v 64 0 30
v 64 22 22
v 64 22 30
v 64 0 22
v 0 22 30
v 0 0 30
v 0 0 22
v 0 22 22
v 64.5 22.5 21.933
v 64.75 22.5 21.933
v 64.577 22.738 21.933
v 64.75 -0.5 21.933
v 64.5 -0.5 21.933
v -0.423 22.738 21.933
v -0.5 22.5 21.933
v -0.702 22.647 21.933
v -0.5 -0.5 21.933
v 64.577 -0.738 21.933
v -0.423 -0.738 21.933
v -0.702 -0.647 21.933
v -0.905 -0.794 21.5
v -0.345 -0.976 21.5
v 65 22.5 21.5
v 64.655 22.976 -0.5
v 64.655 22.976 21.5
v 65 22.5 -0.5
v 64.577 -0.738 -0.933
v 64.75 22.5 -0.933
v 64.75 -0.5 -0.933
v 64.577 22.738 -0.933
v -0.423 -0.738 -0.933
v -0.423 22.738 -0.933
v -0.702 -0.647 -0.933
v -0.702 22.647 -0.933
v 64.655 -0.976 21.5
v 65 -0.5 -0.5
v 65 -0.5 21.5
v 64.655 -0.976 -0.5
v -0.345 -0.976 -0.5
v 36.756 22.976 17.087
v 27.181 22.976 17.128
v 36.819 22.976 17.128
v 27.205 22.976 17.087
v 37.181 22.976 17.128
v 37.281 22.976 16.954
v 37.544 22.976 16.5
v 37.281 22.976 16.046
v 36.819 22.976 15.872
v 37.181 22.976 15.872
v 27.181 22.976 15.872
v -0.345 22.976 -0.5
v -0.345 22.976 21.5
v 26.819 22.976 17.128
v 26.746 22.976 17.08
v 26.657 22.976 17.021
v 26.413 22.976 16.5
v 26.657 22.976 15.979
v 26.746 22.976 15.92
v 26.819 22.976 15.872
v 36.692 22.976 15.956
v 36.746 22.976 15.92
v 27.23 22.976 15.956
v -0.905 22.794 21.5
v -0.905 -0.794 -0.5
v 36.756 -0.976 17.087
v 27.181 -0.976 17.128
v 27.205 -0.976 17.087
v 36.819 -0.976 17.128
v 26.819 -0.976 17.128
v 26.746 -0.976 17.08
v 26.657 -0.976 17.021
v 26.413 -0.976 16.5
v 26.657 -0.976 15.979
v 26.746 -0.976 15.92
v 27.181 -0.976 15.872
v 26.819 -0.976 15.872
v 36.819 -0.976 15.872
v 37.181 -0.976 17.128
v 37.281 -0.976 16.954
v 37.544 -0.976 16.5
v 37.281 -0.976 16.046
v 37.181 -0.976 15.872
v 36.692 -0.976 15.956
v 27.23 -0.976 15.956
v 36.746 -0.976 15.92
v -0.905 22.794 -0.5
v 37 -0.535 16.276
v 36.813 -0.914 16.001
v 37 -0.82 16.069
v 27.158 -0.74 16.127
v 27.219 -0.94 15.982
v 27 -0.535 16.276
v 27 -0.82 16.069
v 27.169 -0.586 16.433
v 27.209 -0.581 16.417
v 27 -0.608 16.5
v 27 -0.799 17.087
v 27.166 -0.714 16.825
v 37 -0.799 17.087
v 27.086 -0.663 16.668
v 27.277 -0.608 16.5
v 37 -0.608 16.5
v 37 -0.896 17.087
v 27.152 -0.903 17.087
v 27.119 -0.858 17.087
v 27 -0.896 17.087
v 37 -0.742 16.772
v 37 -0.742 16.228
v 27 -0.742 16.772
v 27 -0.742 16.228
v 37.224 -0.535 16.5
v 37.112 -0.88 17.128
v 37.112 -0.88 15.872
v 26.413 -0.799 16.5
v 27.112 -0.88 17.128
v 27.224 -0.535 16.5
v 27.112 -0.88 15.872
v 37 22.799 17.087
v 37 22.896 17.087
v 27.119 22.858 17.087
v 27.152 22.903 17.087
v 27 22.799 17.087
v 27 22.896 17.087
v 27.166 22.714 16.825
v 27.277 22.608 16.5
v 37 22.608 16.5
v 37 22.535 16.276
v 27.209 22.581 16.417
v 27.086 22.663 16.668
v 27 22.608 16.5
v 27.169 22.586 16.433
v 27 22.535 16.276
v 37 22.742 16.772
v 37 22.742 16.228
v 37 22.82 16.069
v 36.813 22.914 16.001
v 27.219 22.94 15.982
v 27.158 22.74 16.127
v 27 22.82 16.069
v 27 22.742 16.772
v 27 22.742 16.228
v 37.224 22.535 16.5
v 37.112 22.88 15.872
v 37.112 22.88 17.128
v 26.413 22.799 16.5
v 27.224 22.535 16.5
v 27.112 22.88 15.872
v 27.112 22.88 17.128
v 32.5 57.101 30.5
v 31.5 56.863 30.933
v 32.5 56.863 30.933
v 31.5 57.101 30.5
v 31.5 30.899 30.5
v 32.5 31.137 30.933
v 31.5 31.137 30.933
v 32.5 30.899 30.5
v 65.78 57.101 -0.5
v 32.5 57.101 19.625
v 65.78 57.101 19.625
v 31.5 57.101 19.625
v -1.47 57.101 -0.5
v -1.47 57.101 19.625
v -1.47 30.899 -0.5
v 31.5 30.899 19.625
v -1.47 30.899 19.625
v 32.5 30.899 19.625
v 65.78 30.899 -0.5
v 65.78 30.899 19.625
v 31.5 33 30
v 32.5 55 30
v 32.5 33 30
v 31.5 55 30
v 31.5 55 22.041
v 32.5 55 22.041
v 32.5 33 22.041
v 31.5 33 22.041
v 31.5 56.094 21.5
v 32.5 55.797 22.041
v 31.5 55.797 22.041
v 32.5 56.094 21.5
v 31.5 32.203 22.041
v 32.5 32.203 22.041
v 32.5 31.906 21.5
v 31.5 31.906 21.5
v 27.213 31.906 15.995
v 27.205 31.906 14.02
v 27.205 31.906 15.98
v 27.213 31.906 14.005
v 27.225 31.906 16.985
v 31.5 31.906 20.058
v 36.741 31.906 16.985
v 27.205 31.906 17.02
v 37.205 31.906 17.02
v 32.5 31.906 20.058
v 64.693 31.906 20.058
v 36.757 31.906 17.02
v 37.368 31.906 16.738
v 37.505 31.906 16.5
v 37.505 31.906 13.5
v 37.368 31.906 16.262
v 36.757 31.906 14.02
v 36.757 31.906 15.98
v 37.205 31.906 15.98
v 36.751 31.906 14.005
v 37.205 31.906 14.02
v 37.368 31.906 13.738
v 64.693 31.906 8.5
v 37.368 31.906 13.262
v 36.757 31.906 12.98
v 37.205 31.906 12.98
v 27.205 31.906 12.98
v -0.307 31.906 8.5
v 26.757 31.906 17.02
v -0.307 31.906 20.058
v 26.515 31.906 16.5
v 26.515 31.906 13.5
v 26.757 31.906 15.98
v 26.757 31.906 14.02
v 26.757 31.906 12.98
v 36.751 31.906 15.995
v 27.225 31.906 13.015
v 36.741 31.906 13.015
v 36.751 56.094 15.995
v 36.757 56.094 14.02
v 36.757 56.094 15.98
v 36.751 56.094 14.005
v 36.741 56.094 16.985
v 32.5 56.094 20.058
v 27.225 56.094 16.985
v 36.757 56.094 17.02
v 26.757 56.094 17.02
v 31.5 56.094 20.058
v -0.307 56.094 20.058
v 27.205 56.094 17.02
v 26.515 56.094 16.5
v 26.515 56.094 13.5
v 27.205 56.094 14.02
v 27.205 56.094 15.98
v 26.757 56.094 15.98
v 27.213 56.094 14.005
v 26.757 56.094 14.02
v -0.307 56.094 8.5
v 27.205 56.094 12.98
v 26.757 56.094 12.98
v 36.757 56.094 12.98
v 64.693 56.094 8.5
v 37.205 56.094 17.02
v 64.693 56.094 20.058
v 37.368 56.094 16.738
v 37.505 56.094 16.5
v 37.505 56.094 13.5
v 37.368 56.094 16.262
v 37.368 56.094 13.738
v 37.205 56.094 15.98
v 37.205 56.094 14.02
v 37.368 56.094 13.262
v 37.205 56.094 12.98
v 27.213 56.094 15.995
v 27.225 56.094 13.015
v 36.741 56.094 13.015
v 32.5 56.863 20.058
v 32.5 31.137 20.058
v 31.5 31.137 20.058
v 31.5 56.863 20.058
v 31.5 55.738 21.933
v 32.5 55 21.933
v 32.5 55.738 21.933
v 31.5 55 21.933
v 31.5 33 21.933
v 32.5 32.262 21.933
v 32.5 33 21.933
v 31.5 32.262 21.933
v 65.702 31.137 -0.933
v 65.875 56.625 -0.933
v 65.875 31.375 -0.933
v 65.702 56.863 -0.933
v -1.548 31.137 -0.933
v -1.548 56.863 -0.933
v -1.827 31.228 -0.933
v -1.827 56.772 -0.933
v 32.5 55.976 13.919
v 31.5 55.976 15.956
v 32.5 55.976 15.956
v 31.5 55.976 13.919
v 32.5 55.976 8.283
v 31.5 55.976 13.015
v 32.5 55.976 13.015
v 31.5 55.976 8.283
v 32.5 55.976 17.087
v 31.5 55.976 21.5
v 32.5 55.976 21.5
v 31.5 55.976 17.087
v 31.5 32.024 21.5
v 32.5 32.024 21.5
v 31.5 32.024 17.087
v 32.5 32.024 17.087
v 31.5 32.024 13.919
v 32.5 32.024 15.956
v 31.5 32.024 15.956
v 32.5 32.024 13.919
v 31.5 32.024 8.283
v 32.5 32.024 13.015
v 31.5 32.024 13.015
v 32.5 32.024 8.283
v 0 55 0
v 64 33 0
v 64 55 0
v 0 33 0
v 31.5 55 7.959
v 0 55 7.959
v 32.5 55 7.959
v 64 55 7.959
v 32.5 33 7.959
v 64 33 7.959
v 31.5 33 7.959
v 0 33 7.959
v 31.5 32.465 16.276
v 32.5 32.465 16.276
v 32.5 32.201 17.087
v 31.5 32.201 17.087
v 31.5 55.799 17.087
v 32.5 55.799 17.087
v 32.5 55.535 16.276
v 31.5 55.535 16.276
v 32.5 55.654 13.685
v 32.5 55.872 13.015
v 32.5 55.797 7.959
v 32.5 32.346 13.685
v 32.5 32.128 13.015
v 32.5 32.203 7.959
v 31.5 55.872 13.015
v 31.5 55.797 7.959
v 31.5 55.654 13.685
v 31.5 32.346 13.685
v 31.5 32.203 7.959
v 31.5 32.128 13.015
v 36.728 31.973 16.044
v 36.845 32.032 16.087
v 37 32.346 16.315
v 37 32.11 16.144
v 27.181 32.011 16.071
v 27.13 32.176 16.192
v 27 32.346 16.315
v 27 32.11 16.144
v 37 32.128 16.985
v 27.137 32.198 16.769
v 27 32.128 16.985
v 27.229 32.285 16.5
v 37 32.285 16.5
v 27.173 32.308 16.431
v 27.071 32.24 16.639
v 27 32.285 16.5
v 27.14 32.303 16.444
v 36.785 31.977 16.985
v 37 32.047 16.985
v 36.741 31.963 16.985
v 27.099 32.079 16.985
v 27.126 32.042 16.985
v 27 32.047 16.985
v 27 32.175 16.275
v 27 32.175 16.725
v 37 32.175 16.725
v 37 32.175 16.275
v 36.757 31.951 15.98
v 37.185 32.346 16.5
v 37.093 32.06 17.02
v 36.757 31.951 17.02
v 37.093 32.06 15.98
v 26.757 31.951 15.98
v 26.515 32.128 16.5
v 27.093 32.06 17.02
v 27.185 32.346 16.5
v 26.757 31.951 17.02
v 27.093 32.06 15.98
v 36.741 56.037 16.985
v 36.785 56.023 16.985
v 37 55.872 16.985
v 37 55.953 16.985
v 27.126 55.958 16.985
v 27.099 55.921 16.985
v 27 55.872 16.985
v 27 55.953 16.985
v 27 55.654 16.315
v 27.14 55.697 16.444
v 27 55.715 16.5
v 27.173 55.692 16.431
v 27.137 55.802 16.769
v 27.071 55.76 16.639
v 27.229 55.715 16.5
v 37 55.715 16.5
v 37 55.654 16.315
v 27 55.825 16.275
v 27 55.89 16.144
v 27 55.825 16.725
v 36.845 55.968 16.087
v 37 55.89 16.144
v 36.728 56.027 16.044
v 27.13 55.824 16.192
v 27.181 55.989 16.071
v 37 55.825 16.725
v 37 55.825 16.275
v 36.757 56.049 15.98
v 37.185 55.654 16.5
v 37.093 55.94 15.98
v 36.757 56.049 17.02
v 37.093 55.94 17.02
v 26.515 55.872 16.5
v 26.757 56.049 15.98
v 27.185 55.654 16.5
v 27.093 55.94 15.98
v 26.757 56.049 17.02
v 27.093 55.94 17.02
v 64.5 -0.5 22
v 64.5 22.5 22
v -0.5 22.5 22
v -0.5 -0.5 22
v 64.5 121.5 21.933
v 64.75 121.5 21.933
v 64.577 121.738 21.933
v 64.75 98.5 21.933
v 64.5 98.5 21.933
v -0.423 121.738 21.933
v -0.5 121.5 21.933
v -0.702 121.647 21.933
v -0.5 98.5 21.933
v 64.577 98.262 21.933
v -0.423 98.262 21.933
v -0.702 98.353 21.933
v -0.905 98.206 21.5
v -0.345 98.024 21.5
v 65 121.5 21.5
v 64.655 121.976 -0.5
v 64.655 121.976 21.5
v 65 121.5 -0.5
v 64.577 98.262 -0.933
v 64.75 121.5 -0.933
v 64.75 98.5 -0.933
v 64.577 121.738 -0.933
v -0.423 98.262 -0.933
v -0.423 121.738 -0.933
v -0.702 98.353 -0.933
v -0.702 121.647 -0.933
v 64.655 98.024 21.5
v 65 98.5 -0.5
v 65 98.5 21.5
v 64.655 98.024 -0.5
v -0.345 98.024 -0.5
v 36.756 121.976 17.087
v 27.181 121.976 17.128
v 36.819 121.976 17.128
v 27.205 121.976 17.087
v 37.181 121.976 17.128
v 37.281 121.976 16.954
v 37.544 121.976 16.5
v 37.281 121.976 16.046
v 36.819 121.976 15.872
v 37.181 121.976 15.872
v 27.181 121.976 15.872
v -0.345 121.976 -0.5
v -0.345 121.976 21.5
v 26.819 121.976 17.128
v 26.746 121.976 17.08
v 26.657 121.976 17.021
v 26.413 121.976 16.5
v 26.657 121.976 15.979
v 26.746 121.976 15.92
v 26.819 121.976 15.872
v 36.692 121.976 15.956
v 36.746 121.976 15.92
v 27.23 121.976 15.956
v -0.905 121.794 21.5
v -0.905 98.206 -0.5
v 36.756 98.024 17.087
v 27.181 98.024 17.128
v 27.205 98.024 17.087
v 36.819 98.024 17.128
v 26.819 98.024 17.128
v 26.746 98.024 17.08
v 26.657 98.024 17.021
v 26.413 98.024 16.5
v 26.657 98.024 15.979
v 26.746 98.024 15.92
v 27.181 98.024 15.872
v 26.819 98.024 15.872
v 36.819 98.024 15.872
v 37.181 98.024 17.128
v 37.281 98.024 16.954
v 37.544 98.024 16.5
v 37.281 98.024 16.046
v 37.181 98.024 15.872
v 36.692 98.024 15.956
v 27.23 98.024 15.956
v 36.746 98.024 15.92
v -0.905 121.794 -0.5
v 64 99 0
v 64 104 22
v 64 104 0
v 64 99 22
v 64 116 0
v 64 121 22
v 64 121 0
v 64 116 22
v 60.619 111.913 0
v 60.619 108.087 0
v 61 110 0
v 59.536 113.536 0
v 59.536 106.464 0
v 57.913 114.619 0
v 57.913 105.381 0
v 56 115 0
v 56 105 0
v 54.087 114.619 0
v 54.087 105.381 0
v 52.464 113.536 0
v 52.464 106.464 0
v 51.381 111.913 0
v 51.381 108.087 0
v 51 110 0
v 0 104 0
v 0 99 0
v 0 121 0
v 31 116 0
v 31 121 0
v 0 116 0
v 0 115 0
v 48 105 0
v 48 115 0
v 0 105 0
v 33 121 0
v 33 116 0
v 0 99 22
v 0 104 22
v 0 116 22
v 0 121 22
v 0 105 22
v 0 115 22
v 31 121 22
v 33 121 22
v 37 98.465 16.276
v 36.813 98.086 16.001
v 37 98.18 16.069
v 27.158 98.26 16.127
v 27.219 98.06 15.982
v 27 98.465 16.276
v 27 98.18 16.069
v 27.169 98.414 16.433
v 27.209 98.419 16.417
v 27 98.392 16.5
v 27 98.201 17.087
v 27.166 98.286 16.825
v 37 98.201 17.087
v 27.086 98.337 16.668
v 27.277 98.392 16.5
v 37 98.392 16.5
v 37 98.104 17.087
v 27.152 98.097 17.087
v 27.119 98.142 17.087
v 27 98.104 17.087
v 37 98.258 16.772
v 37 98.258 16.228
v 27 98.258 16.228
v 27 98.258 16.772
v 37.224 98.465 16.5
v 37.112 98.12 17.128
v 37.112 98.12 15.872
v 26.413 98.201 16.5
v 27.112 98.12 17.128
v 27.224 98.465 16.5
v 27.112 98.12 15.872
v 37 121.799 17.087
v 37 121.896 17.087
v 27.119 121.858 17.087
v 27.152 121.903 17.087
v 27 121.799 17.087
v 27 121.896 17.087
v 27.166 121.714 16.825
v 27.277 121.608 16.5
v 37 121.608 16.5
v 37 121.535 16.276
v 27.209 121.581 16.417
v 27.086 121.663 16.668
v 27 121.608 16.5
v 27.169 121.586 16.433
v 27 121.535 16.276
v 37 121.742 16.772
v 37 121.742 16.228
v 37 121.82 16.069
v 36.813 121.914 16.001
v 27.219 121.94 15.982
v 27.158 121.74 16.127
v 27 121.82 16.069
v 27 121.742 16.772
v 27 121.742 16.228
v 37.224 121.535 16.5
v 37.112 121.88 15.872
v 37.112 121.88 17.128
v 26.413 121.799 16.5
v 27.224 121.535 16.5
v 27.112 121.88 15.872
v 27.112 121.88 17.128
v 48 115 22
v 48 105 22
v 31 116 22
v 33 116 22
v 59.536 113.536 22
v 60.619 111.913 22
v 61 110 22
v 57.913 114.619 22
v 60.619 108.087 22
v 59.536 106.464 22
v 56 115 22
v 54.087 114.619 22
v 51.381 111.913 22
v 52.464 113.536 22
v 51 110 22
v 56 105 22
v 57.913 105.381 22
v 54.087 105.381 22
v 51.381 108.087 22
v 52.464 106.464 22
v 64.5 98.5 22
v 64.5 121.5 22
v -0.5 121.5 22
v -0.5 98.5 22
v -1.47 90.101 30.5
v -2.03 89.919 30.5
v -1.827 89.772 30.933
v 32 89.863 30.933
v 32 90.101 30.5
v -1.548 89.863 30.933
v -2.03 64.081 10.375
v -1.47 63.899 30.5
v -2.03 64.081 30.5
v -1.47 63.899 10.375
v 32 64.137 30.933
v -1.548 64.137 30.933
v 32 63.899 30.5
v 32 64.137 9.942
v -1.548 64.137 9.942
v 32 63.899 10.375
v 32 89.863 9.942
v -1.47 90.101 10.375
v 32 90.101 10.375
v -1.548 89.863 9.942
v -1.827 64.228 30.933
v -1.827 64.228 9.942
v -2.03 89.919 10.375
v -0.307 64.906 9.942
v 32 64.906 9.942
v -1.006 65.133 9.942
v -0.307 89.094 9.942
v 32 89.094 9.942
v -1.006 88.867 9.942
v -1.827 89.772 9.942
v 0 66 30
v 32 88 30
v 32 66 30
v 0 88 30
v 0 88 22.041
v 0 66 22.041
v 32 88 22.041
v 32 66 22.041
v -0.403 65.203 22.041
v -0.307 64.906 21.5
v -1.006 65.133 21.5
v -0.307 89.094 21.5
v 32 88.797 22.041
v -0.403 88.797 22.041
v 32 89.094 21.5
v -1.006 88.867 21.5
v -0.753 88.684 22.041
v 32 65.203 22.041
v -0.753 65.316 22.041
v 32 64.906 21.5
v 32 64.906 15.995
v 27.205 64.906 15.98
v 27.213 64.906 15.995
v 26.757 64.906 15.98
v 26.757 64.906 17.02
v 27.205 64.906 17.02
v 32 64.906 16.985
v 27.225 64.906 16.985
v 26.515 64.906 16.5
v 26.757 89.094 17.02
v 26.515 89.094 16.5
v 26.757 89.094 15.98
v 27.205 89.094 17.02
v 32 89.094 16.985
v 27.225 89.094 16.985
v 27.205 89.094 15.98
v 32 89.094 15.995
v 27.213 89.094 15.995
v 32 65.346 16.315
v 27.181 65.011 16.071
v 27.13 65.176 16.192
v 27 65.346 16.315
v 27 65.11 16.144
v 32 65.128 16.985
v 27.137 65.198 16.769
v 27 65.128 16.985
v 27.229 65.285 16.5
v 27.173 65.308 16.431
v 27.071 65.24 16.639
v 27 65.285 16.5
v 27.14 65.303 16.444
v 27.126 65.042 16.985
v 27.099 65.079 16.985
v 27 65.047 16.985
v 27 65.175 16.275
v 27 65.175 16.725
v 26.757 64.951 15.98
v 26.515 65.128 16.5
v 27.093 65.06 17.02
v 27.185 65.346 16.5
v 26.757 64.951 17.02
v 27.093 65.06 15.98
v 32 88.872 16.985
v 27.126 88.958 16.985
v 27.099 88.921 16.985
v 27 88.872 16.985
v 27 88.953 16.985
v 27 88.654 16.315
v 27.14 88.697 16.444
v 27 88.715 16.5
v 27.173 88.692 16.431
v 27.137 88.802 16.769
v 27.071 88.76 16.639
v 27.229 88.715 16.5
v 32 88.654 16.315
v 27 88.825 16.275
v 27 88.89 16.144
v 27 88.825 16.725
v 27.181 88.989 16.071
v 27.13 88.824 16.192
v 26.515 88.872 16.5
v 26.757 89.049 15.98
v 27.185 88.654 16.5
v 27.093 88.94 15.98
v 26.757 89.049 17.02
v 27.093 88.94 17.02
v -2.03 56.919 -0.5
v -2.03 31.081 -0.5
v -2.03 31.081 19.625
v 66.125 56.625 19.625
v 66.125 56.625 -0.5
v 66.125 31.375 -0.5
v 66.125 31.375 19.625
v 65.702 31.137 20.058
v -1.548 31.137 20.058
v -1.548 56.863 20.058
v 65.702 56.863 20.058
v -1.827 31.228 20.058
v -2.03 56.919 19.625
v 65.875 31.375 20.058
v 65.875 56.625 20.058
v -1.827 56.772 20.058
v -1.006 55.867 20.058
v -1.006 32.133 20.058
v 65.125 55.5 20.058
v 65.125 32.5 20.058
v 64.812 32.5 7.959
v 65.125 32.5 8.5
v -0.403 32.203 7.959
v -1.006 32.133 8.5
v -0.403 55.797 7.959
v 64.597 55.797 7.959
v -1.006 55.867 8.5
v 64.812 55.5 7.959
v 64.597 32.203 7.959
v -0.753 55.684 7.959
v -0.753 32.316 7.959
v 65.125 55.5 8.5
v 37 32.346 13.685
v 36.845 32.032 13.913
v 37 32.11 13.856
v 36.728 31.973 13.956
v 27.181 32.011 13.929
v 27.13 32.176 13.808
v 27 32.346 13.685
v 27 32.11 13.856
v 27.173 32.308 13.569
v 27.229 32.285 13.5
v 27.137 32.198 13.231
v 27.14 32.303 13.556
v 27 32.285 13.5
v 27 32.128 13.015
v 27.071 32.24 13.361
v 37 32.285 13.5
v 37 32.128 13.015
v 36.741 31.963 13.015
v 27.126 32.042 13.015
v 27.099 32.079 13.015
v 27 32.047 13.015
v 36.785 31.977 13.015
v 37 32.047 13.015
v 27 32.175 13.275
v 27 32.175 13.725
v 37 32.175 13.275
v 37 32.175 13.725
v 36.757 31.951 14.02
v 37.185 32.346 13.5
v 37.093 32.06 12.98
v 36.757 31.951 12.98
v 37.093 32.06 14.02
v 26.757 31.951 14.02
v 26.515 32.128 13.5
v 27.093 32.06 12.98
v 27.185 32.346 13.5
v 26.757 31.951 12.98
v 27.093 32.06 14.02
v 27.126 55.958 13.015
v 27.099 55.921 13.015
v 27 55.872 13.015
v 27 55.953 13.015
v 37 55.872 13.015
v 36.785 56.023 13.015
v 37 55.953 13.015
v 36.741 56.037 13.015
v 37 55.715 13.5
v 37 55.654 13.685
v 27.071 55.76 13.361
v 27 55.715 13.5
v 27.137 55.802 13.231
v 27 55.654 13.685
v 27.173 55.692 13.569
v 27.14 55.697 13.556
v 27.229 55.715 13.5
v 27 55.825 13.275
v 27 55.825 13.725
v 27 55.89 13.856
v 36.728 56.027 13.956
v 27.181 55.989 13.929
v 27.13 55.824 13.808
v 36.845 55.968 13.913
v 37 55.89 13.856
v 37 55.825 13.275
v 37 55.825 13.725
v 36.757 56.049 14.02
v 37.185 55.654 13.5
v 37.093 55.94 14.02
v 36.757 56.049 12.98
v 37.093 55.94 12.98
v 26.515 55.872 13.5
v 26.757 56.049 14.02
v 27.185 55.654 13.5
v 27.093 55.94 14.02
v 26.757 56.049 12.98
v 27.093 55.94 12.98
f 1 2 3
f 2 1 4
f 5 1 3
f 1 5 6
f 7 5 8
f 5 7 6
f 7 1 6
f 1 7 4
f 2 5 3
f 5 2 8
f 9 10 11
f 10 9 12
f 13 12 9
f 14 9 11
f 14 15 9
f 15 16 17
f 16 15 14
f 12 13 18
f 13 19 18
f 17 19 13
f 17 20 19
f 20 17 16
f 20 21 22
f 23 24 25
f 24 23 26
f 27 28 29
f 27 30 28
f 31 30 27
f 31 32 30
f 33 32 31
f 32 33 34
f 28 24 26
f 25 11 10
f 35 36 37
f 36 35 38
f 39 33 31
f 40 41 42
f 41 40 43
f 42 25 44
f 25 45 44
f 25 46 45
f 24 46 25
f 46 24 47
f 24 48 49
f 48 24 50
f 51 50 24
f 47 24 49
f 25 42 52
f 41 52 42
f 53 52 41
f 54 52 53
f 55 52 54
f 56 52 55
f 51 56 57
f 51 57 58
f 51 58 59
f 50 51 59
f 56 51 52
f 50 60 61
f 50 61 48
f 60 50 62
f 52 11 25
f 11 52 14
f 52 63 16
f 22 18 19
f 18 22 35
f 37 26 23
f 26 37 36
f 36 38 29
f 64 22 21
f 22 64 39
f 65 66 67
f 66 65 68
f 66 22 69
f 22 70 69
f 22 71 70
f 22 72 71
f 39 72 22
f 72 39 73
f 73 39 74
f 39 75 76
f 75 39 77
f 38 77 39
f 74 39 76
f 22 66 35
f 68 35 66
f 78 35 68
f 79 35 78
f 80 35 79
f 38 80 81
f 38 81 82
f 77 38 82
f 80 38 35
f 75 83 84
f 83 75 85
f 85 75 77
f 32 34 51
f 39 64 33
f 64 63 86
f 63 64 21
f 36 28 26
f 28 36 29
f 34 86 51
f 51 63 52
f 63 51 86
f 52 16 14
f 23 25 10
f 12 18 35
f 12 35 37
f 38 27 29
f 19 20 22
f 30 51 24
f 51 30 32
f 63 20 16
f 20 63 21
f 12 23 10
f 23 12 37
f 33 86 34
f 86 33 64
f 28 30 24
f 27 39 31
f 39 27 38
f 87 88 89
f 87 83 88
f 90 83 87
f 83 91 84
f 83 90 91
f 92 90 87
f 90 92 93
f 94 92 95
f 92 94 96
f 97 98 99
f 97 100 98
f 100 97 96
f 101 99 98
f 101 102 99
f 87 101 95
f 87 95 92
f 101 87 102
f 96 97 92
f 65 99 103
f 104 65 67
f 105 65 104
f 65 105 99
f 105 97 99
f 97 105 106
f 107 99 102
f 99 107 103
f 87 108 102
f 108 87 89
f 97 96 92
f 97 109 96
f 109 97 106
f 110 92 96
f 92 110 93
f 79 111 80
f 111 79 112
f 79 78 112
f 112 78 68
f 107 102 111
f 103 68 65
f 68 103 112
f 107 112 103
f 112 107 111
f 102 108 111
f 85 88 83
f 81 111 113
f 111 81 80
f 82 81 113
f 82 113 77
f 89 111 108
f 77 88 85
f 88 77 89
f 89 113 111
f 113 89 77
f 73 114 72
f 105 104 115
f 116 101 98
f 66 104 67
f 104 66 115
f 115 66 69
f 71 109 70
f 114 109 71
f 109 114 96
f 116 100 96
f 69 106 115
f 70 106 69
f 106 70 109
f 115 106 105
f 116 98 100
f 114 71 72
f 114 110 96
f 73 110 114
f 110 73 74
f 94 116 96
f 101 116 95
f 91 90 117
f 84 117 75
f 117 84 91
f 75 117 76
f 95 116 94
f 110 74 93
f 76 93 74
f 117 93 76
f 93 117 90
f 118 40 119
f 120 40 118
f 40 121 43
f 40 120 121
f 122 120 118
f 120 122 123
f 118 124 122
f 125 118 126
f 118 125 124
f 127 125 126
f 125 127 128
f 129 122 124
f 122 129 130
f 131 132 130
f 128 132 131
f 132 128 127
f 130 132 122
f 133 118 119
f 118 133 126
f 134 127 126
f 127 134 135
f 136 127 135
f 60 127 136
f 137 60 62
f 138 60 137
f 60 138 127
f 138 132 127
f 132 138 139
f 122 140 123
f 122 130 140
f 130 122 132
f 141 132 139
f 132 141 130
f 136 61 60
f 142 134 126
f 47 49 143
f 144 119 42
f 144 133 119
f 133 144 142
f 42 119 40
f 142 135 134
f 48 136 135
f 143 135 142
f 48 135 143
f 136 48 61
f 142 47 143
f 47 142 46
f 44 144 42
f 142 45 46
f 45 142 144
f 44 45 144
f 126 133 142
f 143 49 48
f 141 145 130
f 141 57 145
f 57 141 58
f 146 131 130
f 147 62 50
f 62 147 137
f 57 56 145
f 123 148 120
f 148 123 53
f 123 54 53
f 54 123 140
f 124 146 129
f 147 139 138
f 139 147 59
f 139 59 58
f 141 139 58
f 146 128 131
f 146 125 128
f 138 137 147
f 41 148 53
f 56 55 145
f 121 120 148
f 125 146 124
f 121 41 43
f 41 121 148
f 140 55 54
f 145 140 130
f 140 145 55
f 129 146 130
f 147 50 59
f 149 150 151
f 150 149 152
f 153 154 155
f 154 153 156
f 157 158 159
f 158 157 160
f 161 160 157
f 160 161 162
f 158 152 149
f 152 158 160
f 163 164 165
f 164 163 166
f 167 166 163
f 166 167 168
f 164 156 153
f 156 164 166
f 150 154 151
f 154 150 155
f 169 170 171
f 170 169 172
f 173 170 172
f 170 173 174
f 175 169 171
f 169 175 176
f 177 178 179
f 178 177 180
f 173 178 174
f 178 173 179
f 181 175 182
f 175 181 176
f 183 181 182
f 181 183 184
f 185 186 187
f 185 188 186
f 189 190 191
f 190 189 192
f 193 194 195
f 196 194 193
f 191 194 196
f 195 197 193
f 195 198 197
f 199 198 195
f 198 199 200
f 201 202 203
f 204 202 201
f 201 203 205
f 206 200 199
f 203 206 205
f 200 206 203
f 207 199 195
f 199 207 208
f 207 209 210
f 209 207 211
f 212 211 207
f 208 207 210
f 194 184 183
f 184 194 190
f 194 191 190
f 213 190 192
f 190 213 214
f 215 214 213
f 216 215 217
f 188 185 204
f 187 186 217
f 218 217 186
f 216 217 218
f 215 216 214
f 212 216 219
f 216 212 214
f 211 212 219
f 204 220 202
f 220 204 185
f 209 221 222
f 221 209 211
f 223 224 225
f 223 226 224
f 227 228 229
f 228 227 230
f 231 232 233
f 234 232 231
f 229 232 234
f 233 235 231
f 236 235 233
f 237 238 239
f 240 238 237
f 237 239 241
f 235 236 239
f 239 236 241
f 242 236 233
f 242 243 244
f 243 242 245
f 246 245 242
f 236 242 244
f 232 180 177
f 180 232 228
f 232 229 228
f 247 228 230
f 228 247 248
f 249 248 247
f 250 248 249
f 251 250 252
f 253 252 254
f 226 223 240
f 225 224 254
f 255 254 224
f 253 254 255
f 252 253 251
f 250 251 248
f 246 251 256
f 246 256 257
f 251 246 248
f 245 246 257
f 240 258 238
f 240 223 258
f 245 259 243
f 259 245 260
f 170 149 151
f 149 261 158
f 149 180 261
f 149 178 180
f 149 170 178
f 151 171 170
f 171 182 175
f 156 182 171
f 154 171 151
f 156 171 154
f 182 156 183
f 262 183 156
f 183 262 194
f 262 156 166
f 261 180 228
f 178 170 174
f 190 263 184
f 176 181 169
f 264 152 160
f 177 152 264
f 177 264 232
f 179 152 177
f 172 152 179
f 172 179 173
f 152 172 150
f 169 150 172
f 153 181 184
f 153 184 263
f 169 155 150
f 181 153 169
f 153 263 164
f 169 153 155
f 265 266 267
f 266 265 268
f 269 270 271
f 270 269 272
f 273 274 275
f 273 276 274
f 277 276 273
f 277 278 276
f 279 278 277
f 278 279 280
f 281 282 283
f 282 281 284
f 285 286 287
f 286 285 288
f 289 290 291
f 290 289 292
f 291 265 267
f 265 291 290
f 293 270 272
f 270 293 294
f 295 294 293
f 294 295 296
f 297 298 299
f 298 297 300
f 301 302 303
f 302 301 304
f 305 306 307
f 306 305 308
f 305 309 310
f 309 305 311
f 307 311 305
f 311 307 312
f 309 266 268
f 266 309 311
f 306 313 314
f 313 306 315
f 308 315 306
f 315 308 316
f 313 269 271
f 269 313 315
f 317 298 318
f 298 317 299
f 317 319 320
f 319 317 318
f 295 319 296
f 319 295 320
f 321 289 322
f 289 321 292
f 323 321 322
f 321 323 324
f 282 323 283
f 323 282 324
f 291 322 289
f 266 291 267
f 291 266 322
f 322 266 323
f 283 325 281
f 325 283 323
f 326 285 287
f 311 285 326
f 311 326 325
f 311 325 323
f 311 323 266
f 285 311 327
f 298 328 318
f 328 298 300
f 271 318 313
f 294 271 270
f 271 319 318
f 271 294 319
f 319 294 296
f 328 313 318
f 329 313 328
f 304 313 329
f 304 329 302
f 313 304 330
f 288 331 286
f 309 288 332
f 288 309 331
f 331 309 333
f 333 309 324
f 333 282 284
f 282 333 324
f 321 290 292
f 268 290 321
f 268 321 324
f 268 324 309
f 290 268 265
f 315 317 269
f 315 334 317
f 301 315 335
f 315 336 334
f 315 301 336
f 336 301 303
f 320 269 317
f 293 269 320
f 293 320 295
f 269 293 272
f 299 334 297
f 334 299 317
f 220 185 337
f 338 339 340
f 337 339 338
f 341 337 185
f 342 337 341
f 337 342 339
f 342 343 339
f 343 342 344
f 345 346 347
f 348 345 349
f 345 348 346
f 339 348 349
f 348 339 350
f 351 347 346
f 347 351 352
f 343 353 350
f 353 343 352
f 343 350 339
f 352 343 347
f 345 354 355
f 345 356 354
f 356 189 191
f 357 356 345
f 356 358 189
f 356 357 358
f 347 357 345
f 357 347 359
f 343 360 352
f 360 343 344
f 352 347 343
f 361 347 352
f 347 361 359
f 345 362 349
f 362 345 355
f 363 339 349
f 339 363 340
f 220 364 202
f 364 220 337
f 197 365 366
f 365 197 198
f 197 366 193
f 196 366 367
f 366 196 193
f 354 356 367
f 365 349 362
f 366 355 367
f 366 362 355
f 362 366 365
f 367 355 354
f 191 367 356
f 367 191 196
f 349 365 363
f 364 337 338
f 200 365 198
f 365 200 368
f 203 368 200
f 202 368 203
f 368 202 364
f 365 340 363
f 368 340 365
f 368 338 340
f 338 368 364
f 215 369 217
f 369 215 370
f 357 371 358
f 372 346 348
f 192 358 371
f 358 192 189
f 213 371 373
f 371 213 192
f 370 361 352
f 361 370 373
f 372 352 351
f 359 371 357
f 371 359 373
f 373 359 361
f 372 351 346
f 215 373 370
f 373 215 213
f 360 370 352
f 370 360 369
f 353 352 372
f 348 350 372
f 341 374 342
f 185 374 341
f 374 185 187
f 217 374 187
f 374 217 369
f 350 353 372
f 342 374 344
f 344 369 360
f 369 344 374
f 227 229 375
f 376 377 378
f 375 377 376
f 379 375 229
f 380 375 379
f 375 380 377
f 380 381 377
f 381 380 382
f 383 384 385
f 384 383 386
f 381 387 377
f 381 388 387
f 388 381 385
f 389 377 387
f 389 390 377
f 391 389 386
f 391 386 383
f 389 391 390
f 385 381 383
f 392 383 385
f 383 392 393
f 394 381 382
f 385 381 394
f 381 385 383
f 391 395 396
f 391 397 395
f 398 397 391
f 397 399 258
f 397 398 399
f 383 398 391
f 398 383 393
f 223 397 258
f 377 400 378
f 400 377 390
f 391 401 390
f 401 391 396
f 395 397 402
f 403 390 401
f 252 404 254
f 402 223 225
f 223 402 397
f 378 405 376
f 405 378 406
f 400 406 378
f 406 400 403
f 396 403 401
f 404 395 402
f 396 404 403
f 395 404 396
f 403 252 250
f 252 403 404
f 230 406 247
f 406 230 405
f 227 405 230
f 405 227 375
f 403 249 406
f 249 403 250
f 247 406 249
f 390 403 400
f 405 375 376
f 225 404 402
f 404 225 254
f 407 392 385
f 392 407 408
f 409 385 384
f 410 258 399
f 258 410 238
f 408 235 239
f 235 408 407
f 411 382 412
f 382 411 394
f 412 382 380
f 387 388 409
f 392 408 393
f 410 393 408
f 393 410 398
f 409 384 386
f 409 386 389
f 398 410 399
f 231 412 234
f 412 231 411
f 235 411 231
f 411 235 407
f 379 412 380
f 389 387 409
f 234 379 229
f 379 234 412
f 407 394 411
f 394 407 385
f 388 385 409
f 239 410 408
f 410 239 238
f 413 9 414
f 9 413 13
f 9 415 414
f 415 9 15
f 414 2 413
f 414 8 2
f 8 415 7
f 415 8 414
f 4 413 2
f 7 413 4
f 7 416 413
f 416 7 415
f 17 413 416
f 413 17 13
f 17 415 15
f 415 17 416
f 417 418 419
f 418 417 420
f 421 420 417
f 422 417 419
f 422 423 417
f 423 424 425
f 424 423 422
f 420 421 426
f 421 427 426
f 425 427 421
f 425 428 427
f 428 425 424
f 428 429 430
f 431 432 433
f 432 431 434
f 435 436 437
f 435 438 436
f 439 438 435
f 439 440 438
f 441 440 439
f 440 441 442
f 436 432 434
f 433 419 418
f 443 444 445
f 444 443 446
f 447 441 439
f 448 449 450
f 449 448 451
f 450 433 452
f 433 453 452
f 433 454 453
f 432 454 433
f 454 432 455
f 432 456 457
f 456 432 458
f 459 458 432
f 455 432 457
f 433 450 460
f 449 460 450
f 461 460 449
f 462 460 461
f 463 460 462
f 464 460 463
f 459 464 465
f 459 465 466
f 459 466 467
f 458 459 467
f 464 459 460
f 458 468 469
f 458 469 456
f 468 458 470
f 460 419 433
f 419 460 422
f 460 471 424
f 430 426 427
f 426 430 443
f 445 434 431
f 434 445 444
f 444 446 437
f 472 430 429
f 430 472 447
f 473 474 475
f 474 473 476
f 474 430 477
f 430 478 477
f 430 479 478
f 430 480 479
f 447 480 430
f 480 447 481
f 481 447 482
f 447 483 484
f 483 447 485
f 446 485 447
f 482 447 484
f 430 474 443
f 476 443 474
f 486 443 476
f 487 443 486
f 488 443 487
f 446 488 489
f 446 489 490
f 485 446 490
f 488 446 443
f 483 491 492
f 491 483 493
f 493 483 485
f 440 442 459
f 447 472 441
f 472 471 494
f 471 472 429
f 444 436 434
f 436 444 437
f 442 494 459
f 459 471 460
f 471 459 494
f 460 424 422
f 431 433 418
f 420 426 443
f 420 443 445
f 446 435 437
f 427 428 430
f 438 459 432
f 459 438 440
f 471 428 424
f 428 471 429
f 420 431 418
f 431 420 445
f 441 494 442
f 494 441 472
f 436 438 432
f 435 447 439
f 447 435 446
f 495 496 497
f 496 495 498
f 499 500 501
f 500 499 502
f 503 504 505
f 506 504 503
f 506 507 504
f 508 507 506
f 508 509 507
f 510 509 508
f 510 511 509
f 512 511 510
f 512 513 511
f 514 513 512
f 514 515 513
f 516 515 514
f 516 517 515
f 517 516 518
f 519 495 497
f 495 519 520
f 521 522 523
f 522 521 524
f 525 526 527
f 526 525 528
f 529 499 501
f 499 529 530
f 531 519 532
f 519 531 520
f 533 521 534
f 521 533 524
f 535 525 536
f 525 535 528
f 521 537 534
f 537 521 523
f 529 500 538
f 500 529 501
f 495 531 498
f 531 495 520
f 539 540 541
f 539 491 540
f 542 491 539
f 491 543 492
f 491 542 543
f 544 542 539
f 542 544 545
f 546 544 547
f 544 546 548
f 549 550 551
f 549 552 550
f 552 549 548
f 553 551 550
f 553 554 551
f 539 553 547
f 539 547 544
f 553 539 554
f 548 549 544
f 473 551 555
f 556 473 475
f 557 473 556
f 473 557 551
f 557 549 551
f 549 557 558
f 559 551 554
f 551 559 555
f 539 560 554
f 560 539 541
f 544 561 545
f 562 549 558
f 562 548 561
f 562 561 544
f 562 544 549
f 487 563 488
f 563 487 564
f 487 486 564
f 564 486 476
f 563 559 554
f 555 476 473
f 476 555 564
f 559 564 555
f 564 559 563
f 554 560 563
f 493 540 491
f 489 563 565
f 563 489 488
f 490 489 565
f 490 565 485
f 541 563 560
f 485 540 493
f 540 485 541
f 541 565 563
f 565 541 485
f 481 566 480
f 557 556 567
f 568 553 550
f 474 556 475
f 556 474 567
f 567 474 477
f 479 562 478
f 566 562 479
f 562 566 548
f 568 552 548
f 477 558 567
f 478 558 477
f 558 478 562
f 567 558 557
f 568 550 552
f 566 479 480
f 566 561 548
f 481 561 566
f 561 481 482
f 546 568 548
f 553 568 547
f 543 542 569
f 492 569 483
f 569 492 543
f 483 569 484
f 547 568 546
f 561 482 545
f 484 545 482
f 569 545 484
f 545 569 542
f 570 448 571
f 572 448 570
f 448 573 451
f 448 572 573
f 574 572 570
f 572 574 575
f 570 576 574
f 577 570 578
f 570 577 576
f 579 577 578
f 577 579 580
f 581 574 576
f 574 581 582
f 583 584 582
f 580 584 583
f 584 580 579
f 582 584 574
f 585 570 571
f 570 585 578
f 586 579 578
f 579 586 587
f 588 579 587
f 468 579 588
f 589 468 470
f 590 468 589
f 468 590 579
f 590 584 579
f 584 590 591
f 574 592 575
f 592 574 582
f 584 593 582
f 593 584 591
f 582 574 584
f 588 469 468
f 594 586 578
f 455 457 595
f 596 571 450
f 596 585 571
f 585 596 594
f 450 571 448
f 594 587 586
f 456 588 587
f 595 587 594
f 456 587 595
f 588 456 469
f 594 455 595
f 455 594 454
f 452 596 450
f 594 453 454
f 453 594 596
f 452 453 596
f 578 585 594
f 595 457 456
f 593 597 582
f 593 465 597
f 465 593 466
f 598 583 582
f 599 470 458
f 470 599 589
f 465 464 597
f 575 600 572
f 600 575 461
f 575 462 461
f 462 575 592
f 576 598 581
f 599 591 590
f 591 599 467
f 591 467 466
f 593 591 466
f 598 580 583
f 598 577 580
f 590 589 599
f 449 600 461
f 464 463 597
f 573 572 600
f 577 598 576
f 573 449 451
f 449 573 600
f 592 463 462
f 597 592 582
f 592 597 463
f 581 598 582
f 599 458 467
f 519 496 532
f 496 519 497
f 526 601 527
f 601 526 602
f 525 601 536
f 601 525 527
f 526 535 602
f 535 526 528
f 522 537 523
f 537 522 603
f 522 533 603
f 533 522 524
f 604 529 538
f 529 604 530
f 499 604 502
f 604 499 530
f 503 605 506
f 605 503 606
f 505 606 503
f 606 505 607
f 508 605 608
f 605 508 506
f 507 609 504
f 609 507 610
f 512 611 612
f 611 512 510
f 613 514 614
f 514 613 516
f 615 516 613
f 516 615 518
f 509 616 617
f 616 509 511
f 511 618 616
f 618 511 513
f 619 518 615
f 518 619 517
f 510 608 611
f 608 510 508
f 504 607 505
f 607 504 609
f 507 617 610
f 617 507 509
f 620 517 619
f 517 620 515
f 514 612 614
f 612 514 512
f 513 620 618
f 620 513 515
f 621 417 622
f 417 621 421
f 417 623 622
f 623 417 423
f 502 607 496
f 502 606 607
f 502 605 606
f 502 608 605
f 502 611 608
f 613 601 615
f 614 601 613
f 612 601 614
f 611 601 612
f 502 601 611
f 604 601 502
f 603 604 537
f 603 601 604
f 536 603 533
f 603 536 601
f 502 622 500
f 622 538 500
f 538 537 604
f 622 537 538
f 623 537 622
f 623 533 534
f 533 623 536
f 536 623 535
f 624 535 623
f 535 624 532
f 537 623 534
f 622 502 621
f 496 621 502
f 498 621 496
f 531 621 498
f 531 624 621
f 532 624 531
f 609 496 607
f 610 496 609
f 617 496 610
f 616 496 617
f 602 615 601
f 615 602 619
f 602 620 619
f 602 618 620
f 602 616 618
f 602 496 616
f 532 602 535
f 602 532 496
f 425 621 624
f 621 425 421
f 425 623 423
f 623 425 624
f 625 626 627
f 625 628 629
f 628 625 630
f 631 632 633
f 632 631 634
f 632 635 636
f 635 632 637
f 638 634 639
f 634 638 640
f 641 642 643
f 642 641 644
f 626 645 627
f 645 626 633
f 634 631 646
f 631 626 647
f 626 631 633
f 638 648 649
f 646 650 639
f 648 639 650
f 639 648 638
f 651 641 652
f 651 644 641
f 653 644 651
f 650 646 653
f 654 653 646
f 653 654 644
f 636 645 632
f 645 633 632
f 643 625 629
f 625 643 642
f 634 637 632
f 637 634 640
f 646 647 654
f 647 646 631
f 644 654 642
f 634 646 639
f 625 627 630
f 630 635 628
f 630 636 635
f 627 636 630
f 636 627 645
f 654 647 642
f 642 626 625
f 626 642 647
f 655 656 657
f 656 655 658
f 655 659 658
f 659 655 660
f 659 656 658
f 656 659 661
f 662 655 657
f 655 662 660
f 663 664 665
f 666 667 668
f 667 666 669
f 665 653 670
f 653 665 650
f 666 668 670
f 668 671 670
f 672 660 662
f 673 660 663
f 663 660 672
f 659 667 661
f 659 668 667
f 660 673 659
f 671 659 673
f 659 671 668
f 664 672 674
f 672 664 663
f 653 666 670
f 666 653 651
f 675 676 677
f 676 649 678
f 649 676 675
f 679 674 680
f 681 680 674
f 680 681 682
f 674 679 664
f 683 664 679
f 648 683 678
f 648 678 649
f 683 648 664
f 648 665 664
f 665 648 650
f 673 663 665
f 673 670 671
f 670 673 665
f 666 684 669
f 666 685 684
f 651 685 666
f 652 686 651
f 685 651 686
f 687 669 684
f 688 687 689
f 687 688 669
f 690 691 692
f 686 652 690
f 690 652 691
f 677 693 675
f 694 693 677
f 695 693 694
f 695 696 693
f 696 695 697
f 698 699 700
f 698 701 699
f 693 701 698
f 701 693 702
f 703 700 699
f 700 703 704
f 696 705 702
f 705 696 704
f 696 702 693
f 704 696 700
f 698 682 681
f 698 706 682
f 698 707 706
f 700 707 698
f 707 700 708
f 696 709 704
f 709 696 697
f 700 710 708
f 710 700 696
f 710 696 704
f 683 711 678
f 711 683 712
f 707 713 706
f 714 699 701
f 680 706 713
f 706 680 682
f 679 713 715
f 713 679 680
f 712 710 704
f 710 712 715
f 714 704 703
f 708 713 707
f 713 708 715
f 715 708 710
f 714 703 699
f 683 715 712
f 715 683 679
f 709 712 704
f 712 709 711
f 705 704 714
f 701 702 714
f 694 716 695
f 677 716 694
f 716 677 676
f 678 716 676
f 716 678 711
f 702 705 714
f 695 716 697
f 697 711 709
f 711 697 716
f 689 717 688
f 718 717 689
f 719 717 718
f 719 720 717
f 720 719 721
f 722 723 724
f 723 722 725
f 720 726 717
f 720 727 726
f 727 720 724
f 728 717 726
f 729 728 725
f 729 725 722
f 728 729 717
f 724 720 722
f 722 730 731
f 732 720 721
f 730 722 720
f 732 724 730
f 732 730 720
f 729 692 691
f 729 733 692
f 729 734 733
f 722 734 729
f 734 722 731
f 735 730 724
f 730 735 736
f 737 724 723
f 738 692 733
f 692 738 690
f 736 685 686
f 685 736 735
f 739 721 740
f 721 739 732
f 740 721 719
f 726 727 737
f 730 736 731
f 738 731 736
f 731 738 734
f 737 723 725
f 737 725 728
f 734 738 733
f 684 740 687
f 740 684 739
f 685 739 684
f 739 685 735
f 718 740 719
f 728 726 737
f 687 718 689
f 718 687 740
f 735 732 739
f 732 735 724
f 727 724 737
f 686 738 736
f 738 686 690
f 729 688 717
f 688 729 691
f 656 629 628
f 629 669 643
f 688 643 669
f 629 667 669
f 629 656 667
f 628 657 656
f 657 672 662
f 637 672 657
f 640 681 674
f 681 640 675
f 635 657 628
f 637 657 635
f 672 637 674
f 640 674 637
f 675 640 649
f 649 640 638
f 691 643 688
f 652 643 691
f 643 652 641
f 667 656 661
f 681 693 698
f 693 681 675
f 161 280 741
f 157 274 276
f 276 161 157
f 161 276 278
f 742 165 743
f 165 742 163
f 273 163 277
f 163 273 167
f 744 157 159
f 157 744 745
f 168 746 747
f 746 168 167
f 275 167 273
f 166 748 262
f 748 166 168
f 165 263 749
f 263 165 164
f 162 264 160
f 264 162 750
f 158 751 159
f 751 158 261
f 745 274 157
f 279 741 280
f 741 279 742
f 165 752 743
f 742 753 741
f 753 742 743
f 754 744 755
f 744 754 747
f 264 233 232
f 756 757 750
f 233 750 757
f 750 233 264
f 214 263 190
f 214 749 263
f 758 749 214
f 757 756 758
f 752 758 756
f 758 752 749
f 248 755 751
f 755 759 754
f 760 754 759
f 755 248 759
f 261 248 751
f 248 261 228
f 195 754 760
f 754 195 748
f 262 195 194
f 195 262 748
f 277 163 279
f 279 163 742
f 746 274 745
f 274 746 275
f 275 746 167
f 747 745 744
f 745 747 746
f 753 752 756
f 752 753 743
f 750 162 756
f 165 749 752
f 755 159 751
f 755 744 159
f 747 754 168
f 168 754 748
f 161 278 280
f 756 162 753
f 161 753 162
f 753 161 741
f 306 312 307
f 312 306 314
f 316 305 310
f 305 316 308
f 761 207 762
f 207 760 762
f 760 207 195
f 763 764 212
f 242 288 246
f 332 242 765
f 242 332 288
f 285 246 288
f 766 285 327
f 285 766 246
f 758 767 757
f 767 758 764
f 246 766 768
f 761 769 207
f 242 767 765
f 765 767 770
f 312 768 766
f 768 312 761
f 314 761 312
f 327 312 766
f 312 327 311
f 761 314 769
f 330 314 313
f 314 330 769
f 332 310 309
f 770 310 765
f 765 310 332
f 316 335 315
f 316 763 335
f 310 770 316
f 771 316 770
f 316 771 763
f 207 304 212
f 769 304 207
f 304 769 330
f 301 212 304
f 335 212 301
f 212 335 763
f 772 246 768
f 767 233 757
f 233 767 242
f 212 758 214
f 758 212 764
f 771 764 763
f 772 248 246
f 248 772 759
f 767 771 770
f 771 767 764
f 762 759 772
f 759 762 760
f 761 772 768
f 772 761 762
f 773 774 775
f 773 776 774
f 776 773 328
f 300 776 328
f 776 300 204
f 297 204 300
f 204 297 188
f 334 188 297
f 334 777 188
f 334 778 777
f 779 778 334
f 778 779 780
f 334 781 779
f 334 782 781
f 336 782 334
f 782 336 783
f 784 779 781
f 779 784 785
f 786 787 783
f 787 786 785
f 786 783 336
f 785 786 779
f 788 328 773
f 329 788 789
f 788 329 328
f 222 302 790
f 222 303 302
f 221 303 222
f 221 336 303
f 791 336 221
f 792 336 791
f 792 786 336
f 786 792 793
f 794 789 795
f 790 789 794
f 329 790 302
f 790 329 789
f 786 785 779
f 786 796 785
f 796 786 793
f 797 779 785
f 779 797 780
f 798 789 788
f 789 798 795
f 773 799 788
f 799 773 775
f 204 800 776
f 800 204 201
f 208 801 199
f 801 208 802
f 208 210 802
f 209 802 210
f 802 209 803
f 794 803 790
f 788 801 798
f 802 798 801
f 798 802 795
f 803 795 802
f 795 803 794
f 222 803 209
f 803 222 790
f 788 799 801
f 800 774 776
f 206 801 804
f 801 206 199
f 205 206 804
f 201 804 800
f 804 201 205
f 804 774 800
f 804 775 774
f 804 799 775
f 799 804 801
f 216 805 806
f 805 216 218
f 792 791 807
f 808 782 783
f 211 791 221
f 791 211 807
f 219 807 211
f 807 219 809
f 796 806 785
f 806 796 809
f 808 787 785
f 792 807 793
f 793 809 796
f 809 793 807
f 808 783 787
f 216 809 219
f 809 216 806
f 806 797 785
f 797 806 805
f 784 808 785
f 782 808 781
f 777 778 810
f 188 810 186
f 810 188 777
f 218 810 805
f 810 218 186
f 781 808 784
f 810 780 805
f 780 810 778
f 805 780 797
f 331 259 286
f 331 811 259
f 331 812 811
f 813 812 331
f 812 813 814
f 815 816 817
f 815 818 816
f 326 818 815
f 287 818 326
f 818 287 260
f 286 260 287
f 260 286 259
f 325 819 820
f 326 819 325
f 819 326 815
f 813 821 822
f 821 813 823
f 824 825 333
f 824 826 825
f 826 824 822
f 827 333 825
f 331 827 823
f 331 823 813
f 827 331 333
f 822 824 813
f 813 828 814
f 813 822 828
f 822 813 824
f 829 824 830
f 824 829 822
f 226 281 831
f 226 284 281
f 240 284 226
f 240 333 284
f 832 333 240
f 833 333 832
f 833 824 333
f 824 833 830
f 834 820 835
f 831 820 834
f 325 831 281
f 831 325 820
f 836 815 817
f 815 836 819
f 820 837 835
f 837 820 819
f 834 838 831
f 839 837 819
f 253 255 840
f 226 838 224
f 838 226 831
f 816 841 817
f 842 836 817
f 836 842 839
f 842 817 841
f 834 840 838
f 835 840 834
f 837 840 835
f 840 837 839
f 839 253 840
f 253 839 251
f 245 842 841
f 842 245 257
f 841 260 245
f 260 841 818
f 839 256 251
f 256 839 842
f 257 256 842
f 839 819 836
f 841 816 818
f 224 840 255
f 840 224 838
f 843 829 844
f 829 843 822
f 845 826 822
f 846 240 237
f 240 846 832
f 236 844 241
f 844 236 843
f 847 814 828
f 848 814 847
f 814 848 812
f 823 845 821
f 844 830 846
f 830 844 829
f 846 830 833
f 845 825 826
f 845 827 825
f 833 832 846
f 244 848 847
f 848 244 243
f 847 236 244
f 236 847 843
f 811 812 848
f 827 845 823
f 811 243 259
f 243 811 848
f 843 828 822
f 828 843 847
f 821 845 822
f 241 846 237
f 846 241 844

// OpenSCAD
// file: 01_shared.scad
include <00_main.scad>;


module 01_min_vol() {
    cube([size_x,size_y,size_z]);
}

module 01_min_bottom_vol() {
    scale([1,1,1 - top_part])
    01_min_vol();
}

module 01_debug_slice() {
    translate([size_x/2,-size_wall*3,-size_wall*3])
    cube([size_wall, size_y*3, size_z*3], center = true);
}
// file: 05_locker.scad
include <00_main.scad>;

use <03_first_shell.scad>;
use <04_second_shell.scad>;


module _pill_core_locker(offset=0) {
    rotate([0,90,0])
    cylinder(h=locker_x, r=locker_r+offset, center=true);
}

module 05_pill_locker(offset=0) {    
    _pill_core_locker(offset);
    
    translate([locker_x/2,0,0])
    sphere(r=locker_r+offset);
    
    translate([-locker_x/2,0,0])
    sphere(r=locker_r+offset);
}


module 05_pill_locker_mid_position(with_offset=false) {
    mid_overlay = size_z * (1 - top_overlay + (top_overlay - top_part)/2);
    offset_val = with_offset ? second_shell_offset : 0;
    shift_y = second_shell_offset + size_wall + locker_y;

    translate([
        size_x/2,
        -shift_y,
        mid_overlay])
    05_pill_locker(offset=offset_val);
    
    translate([
        size_x/2,
        size_y + shift_y,
        mid_overlay])
    05_pill_locker(offset=offset_val);
}


// DEVELOPING ################################

module 05_slide_with_locker() {
    size_debug = size_wall * 10;
    alpha_debug = 0.5;

    intersection() {
        04_second_shell();
        01_debug_slice();
    }

    intersection() {
        difference() {
            03_first_shell();
            05_pill_locker_mid_position(with_offset=true);
        }
        01_debug_slice();
    }

    intersection() {
        translate([0,0,0]);
        05_pill_locker();
        01_debug_slice();
    }

    05_pill_locker_mid_position();
}

module 05_developing() {
    debug_shift = 10;
    steps = 4;  // decrease step number for better understanding

    translate([0, - (steps - 0) * (debug_shift * 1.5), 0]) {
        _pill_core_locker();
    }

    translate([0, - (steps - 1) * (debug_shift * 1.5), 0]) {
        05_pill_locker();
    }

    translate([0, - (steps - 2) * (debug_shift * 1.5), 0]) {
        05_pill_locker(offset=0.1);
    }

    translate([0, - (steps - 3) * (debug_shift * 1.5), 0]) {
        tmp = 0.1;
        
        difference() {
            #cube([6,2,2]);
            05_pill_locker(offset=tmp);
        }
        
        intersection() {
            cube([6,2,2]);
            05_pill_locker();
        }
    }

    translate([0, - (steps - 4) * (debug_shift * 1.5), 0]) {
        05_slide_with_locker();
    }

}

// Do not forget put all structures under a comment in 00_main.scad
05_developing();
// file: 04_second_shell.scad
include <00_main.scad>;
use <03_first_shell.scad>;

// next line is a debug_line - uncomment to use
// second_shell_cutted_top = false; //rewrite var from 00_main


module _secord_core_shell() {
    if (second_shell_cutted_top) {
        difference() {
            translate([0,0,size_z*(1-top_overlay)])
            scale([1,1,top_overlay])
            01_min_vol();

            translate([
                -size_x/4,
                -size_y/4,
                size_z - second_shell_offset - size_wall
            ])
            scale([1.5, 1.5, 1])
            01_min_vol();
        }
    } else {
        translate([0,0,size_z*(1-top_overlay)])
        scale([1,1,top_overlay])
        01_min_vol();
    }
}

module _secord_core_offset_shell() {
    minkowski() {
       _secord_core_shell();
       cube(second_shell_offset*2, center = true); 
    }
}

module _second_solid_shell() {
    minkowski() {
        _secord_core_offset_shell();
        cube(size_wall*3, center = true);
        sphere(d=size_wall);
    }
}

module _second_pre_shell() {
    difference() {
        _second_solid_shell();
        01_min_vol();
    }
}

module 04_second_shell() {
    difference() {
        _second_pre_shell();
        03_first_solid_shell(second_shell_offset);
    }
}

module 04_slide() {
    size_debug = size_wall * 10;
    alpha_debug = 0.5;

    intersection() {
        04_second_shell();
        01_debug_slice();
    }

    intersection() {
        03_first_shell();
        01_debug_slice();
    }

    // RED - first shell
    translate([size_x/2,0,size_z])
    color([1,0,0,alpha_debug])
    cube([size_debug,size_debug,size_wall]);

    if (!second_shell_cutted_top) {
        // GREEN - second_shell_offset
        translate([size_x/2+size_wall,-size_wall,size_z+size_wall])
        color([0,1,0,alpha_debug])
        cube([size_debug,size_debug,second_shell_offset]);

        // BLUE - second shell
        translate([size_x/2+size_wall*2,-size_wall*2,size_z+size_wall+second_shell_offset])
        color([0,0,1,alpha_debug])
        cube([size_debug,size_debug,size_wall]);
    }
}

// DEVELOPING ################################

module 04_developing() {
    steps = 6;  // decrease step number for better understanding

    translate([0, - (steps - 0) * (size_y * 1.5), 0]) {
        #01_min_vol();
    }

    translate([0, - (steps - 1) * (size_y * 1.5), 0]) {
        _secord_core_shell();
        #01_min_vol();
    }

    translate([0, - (steps - 2) * (size_y * 1.5), 0]) {
        _secord_core_offset_shell();
        #01_min_vol();
    }

    translate([0, - (steps - 3) * (size_y * 1.5), 0]) {
        _second_solid_shell();
    }

    translate([0, - (steps - 4) * (size_y * 1.5), 0]) {
        _second_pre_shell();
    }

    translate([0, - (steps - 5) * (size_y * 1.5), 0]) {
        04_second_shell();
    }

    translate([0, - (steps - 6) * (size_y * 1.5), 0]) {
        04_slide();   
    }
}

// Do not forget put all structures under a comment in 00_main.scad
04_developing();
// file: 03_first_shell.scad
include <00_main.scad>;
use <01_shared.scad>;
use <02_internal_walls.scad>;


module 03_first_solid_shell(second_shell_offset=0) {
    minkowski() {
        01_min_bottom_vol();
        cube(size_wall, center = true);
        sphere(d=size_wall+second_shell_offset*2);
    }
}

module 03_first_shell() {
    difference(){
        03_first_solid_shell();
        01_min_vol();
    }
}


// DEVELOPING ################################

module 03_developing() {
    steps = 5;  // decrease step number for better understanding

    translate([0, - (steps - 0) * (size_y * 1.5), 0]) {
        #01_min_vol();
    }

    translate([0, - (steps - 1) * (size_y * 1.5), 0]) {
        #01_min_vol();
        01_min_bottom_vol();
    }

    translate([0, - (steps - 2) * (size_y * 1.5), 0]) {
        03_first_solid_shell();
    }

    translate([0, - (steps - 3) * (size_y * 1.5), 0]) {
        03_first_shell();
    }

    translate([0, - (steps - 4) * (size_y * 1.5), 0]) {
        02_internal_walls();
    }

    translate([0, - (steps - 5) * (size_y * 1.5), 0]) {
        union() {
            03_first_shell();
            02_internal_walls();
        }
    }
}

// Do not forget put all structures under a comment in 00_main.scad
03_developing();
// file: 02_internal_walls.scad
include <00_main.scad>;
use <01_shared.scad>;


module _min_vol_n_half_wall() {
    minkowski() {
        union() {
            01_min_bottom_vol();
            translate([0,0,size_wall/2])
            01_min_bottom_vol();
        }
        cube(size_wall, center = true);
    }
}

module 02_internal_walls() {
    difference() {
        _min_vol_n_half_wall();
        00_initial_forms();
    }
}


// DEVELOPING ################################

module 02_developing() {
    steps = 3;  // decrease step number for better understanding

    translate([0, - (steps - 0) * (size_y * 1.5), 0]) {
        00_initial_forms();
        #01_min_vol();
    }

    translate([0, - (steps - 1) * (size_y * 1.5), 0]) {
        01_min_bottom_vol();
    }

    translate([0, - (steps - 2) * (size_y * 1.5), 0]) {
        _min_vol_n_half_wall();
    }

    translate([0, - (steps - 3) * (size_y * 1.5), 0]) {
        02_internal_walls();
    }
}

// Do not forget put all structures under a comment in 00_main.scad
02_developing();
// file: 00_main.scad
use <01_shared.scad>;
use <06_assembling.scad>;


// PART_0 ################################

module 00_initial_forms() {
translate([0,0,0]) 
cube([64,5,30]);

translate([0,6,0])
cube([48,10,30]);

translate([0,17,0])
cube([31,5,30]);

translate([31 + 2,17,0])
cube([31,5,30]);
    
translate([56,11,0])
cylinder(30, r=5);
}


//00_initial_forms();


// PART_1 ################################

size_x = 64;
size_y = 22; 
size_z = 30;


//00_initial_forms(); #01_min_vol();


// PART_2 ################################

size_wall = 1;
second_shell_offset = 0.125;

top_part = 0.3;
top_overlay = 0.6;
second_shell_cutted_top = true;

with_locker = true;
locker_x = 10;
locker_r = 0.6;
locker_y = 0.1;


05_preview();


// PART_3 ################################

//$fn=60; 05_first_final_shell();
//$fn=60; 05_second_final_shell();
// main file
include <00_main.scad>;

use <02_internal_walls.scad>
use <03_first_shell.scad>;
use <04_second_shell.scad>;
use <05_locker.scad>;

module 05_first_final_shell() {
    if (with_locker) {
        difference() {
            03_first_shell();
            05_pill_locker_mid_position(with_offset=true);
        }
    }
    else {
        03_first_shell();
    }
    02_internal_walls();
}

module 05_second_final_shell() {
    04_second_shell();
    if (with_locker) {
        05_pill_locker_mid_position(with_offset=false);
    }
}

module 05_preview() {
    00_initial_forms(); #01_min_vol();

    translate([0, size_y * 1.5, 0])
    if (with_locker) {
        05_slide_with_locker();
    } else {
        04_slide();
    }

    translate([0, size_y * 4.5, 0])
    05_first_final_shell();

    translate([0, size_y * 3, 0])
    intersection(){
        05_second_final_shell();
        cube([size_x,size_y*3,size_z*3], center=true);
    }
}


// DEVELOPING ################################

module 05_developing() {    
    05_first_final_shell();

    mirror([0, 0, 1])
    translate([0,size_y*1.5,-size_z])
    05_second_final_shell();
}

// Do not forget put all structures under a comment in 00_main.scad
05_developing();
